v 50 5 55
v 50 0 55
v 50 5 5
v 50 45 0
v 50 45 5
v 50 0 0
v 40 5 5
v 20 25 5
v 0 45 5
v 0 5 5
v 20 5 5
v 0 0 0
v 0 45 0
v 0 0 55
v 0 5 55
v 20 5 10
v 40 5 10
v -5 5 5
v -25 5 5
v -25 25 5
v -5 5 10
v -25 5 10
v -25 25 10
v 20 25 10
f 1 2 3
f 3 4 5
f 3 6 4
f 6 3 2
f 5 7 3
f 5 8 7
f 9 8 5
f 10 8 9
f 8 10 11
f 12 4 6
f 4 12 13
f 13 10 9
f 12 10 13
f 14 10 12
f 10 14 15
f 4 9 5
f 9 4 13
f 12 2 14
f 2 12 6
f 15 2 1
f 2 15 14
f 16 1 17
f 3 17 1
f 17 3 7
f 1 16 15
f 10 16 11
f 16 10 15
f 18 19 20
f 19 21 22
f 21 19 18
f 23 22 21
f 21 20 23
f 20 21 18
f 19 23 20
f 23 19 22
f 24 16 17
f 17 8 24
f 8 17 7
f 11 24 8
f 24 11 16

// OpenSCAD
// === NEMA 17 Stepper Motor Mounting Bracket ===
// Print orientation: base plate on bed (XY plane at z=0)

// --- Base plate dimensions ---
base_x_half = 25;        // Half-width in X (x: -25 to 25)
base_y = 45;             // Depth in Y (y: 0 to 45)
base_z = 5;              // Height/thickness in Z (z: 0 to 5)

// --- Base plate mounting holes (M4, 4.5 mm dia) ---
m4_dia = 4.5;
m4_x = 17;               // X position of holes
m4_y = 30;               // Y position of holes

// --- Vertical motor plate dimensions ---
motor_plate_x_half = 25; // Half-width in X (x: -25 to 25)
motor_plate_y = 5;       // Depth in Y (y: 0 to 5)
motor_plate_z = 50;      // Height in Z (z: 0 to 50)

// --- Motor centring boss hole ---
boss_dia = 23;            // Diameter of centring boss hole
boss_x = 0;               // X centre
boss_z = 28;              // Z centre

// --- Motor mounting holes (M3, 3.4 mm dia) on 31 mm square pattern ---
m3_dia = 3.4;
m3_pattern = 31;           // Square pattern size (31 mm)
m3_half = m3_pattern / 2; // Half of pattern size

// --- Triangular gussets ---
gusset_thickness = 5;     // Thickness in X (flush with edges)
gusset_leg_y = 20;        // Leg along +Y
gusset_leg_z = 20;        // Leg along +Z
gusset_corner_y = 5;       // Y of right-angle corner (where plates meet)
gusset_corner_z = 5;       // Z of right-angle corner

// --- Global fineness for round holes ---
$fn = 64;

// --- Build the part ---
module bracket() {
    // Base plate
    union() {
        // Main base plate
        cube([2 * base_x_half, base_y, base_z], center = [0, 0, 0]);
        
        // Vertical motor plate (standing on back edge of base at y=0)
        translate([0, 0, base_z]) {
            cube([2 * motor_plate_x_half, motor_plate_y, motor_plate_z], center = [0, 0, 0]);
        }
    }
    
    // Cut base plate mounting holes (M4)
    difference() {
        // Re-create the base + motor plate for cutting
        union() {
            cube([2 * base_x_half, base_y, base_z], center = [0, 0, 0]);
            translate([0, 0, base_z]) {
                cube([2 * motor_plate_x_half, motor_plate_y, motor_plate_z], center = [0, 0, 0]);
            }
        }
        
        // M4 holes through base plate (extend past both faces)
        for (x_off = [-m4_x, m4_x]) {
            translate([x_off, m4_y, -0.5]) {
                cylinder(d = m4_dia, h = base_z + 1, center = true);
            }
        }
        
        // Boss hole through motor plate (along Y, extend past front/back)
        translate([boss_x, 0, boss_z]) {
            cylinder(d = boss_dia, h = motor_plate_y + 1, center = true, axis = [0, 1, 0]);
        }
        
        // M3 mounting holes through motor plate (along Y)
        for (x_off = [-m3_half, m3_half]) {
            for (z_off = [-m3_half, m3_half]) {
                translate([x_off, 0, boss_z + z_off]) {
                    cylinder(d = m3_dia, h = motor_plate_y + 1, center = true, axis = [0, 1, 0]);
                }
            }
        }
    }
    
    // Triangular gussets
    for (x_off = [-base_x_half, base_x_half - gusset_thickness]) {
        translate([x_off, gusset_corner_y, gusset_corner_z]) {
            // Right triangle in YZ plane, legs along +Y and +Z
            linear_extrude(height = gusset_thickness) {
                polygon([[0, 0], [gusset_leg_y, 0], [0, gusset_leg_z]]);
            }
        }
    }
}

bracket();
